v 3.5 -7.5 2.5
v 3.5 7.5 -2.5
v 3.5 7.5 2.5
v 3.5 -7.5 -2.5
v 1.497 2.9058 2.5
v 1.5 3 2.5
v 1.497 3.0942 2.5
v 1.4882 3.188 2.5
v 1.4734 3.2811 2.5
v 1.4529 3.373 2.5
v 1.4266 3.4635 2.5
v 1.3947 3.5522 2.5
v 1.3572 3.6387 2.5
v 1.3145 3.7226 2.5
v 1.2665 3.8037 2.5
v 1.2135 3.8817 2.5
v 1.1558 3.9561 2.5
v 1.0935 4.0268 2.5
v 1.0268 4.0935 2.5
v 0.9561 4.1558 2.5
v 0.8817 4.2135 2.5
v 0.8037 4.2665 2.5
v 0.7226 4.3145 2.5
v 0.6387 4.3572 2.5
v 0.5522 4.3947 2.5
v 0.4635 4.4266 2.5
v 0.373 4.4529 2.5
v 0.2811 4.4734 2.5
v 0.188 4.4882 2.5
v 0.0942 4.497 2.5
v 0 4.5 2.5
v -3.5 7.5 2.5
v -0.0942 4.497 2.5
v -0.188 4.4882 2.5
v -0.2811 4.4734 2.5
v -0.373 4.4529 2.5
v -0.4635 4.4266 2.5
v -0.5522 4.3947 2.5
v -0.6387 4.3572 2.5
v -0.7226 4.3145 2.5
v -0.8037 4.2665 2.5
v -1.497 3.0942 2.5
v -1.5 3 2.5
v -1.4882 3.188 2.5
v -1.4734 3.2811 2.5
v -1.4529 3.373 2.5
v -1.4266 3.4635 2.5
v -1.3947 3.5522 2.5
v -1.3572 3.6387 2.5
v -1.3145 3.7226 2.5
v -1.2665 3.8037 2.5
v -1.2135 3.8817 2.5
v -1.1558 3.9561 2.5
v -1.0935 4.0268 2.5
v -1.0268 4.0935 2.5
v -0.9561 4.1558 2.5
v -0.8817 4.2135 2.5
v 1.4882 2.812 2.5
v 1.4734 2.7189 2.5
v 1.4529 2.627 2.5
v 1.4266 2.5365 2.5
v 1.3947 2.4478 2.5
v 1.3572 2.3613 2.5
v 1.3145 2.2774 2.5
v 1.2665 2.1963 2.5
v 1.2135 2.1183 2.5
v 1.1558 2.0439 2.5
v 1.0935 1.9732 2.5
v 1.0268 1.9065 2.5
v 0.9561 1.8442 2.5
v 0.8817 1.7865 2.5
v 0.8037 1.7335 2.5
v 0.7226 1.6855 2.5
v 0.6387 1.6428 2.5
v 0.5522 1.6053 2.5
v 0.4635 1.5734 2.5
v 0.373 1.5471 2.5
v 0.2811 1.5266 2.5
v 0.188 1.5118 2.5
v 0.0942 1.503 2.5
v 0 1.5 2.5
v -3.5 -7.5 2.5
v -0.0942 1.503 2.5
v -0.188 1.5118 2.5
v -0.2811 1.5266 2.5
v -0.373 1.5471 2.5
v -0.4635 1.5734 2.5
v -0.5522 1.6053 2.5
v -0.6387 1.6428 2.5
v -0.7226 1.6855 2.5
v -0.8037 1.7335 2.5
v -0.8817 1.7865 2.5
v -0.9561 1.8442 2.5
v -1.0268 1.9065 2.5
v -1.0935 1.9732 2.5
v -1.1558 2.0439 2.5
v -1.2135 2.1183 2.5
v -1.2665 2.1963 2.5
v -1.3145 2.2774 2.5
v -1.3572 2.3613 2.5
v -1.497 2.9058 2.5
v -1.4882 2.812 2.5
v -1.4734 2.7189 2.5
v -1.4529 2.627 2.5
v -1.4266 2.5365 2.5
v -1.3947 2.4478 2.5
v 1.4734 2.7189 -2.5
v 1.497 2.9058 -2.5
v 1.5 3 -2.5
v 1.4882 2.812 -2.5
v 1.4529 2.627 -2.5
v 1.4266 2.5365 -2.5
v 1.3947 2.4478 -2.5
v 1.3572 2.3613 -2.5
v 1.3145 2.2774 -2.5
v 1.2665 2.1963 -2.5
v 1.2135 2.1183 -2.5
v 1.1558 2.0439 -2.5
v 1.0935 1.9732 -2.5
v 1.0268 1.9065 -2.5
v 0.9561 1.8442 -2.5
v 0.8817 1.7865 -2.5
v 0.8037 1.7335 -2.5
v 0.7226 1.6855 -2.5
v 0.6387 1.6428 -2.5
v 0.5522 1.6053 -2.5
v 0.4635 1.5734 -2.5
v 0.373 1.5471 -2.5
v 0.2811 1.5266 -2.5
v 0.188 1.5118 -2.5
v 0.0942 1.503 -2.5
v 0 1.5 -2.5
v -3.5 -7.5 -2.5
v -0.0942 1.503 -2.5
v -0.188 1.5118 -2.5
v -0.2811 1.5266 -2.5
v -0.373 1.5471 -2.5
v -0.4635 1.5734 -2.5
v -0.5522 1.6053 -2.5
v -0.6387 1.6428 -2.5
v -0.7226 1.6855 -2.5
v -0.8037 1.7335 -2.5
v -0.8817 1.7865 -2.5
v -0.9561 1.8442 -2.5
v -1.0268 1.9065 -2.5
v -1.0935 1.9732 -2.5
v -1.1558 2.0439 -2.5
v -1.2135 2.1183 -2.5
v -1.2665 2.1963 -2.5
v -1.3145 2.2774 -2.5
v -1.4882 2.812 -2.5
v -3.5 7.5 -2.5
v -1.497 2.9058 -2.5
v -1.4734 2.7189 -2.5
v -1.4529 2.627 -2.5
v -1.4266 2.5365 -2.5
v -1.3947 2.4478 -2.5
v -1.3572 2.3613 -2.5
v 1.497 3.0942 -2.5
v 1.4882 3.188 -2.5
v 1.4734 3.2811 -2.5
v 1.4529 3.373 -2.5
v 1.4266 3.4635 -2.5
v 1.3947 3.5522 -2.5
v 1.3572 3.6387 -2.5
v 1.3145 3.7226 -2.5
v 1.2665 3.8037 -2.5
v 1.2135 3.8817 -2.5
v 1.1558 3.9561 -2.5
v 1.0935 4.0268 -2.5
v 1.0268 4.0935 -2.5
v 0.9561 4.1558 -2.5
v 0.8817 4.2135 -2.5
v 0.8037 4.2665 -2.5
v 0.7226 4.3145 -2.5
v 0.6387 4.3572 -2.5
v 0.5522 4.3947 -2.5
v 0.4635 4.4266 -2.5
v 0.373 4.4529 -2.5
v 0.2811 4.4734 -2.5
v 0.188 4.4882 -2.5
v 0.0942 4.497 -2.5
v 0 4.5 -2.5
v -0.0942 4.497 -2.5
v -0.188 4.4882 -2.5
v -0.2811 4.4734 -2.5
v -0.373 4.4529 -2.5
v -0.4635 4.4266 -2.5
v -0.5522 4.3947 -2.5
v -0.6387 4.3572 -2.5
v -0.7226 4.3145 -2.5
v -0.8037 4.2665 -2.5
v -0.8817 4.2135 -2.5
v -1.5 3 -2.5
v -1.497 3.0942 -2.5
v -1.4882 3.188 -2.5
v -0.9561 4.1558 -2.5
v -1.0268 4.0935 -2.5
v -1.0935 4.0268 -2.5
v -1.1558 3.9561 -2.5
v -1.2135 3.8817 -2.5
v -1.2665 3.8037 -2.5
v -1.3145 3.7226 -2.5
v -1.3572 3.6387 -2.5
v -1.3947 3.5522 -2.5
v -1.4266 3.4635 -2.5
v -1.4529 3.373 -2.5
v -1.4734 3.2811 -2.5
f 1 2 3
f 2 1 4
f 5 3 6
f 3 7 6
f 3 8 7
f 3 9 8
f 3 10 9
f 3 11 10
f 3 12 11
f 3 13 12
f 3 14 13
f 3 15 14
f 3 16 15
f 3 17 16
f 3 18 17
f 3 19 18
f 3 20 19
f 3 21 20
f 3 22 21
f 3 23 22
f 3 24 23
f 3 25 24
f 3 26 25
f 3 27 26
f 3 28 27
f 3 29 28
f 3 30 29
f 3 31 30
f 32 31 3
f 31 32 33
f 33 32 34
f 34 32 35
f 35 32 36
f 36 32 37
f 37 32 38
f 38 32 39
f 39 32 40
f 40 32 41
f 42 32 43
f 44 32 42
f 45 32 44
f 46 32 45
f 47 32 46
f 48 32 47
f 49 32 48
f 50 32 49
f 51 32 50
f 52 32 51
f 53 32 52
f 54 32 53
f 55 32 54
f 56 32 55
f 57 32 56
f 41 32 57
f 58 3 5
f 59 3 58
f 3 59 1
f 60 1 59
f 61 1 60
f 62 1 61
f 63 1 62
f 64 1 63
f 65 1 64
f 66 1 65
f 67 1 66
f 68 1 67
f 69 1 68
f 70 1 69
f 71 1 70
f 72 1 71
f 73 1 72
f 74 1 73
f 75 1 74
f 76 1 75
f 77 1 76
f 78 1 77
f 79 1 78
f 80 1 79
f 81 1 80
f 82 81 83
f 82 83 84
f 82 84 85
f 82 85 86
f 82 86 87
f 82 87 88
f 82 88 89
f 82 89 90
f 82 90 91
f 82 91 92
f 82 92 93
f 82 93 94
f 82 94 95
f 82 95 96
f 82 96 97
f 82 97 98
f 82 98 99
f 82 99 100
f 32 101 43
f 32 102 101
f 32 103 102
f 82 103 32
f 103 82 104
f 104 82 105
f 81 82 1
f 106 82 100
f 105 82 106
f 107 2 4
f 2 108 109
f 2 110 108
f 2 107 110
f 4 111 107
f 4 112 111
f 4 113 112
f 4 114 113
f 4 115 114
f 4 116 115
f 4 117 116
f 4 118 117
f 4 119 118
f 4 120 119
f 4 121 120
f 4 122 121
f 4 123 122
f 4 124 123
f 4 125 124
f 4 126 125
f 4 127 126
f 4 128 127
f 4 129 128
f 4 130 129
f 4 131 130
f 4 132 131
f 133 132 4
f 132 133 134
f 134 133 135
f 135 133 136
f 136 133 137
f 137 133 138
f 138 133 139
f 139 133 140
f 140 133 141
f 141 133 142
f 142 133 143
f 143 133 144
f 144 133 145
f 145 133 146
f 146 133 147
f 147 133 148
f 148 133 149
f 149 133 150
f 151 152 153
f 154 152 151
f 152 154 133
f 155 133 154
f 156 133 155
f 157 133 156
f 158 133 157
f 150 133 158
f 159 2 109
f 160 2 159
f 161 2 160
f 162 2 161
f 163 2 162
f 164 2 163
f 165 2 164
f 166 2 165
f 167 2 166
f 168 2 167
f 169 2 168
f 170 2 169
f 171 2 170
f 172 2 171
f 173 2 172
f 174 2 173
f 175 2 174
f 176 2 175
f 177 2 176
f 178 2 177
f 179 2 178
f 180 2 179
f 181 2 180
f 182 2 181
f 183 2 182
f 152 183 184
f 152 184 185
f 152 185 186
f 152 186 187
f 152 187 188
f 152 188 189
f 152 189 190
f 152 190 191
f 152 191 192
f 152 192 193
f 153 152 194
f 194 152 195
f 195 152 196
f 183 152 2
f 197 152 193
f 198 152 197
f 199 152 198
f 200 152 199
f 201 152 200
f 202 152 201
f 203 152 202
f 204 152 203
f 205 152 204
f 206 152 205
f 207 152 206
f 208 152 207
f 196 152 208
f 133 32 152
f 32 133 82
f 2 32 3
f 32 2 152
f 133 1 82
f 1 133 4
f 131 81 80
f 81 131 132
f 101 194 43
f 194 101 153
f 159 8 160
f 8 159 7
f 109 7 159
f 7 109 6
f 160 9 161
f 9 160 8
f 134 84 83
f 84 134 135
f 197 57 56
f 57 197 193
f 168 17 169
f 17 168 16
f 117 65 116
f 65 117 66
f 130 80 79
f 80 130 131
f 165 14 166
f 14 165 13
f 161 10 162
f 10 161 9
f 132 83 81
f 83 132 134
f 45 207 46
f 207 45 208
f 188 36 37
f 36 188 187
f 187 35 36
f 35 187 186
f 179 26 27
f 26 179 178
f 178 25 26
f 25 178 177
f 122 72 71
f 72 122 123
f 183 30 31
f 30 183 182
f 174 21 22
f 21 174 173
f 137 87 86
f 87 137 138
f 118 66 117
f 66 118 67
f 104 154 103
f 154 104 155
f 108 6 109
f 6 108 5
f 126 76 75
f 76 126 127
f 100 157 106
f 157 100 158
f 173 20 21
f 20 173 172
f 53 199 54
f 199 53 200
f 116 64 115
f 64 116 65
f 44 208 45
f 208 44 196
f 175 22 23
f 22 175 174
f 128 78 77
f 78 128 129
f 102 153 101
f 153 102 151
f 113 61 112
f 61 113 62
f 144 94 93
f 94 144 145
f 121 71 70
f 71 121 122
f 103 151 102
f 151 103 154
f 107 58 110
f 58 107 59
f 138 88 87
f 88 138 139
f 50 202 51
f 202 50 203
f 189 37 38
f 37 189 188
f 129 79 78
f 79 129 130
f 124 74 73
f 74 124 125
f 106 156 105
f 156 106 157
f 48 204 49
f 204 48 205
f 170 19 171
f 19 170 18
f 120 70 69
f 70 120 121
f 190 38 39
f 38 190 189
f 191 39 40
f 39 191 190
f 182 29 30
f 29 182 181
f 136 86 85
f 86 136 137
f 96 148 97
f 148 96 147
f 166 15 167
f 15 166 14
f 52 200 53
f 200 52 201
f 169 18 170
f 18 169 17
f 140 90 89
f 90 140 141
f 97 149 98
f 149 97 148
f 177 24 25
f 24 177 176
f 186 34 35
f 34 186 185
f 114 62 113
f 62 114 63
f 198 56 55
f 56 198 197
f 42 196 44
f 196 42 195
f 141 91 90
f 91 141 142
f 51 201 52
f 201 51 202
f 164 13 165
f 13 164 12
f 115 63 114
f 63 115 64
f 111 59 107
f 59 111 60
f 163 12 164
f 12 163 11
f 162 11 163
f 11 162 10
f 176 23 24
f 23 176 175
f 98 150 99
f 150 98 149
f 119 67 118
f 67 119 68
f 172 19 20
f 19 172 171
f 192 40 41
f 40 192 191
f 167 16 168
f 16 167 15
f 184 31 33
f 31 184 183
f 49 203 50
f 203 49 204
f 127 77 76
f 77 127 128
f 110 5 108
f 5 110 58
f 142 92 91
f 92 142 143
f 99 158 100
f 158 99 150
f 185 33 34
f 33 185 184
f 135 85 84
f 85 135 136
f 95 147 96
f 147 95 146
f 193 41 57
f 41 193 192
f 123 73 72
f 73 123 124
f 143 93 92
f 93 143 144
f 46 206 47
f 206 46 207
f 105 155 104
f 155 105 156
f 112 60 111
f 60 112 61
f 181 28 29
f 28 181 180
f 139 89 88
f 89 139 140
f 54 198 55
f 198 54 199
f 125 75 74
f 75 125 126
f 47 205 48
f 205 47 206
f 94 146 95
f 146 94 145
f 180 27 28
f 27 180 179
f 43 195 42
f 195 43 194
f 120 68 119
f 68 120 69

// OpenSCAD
/*
    Filename: array_mount_standoff.scad
    Author: Fred Kim
    Email: fred.kim@cooper.edu
    Date: 07/02/2024
    Description: A standoff to mount quad_dotstar_array_mount onto microscope housing
*/

$fa = 0.1;
$fs = 1;
$fn = 100;

module Standoff() {
  // Units are assumed to be in millimeters
  length = 7;
  width = 15;
  height = 5;

  hole_dia = 1.5;
  hole_offset = 3; //hole offset from leg
  difference() {
      cube([length,width,height],center=true);
      translate([0,hole_offset,0])
      cylinder(h = height+1, r = hole_dia, center=true);
  }
}

Standoff();
